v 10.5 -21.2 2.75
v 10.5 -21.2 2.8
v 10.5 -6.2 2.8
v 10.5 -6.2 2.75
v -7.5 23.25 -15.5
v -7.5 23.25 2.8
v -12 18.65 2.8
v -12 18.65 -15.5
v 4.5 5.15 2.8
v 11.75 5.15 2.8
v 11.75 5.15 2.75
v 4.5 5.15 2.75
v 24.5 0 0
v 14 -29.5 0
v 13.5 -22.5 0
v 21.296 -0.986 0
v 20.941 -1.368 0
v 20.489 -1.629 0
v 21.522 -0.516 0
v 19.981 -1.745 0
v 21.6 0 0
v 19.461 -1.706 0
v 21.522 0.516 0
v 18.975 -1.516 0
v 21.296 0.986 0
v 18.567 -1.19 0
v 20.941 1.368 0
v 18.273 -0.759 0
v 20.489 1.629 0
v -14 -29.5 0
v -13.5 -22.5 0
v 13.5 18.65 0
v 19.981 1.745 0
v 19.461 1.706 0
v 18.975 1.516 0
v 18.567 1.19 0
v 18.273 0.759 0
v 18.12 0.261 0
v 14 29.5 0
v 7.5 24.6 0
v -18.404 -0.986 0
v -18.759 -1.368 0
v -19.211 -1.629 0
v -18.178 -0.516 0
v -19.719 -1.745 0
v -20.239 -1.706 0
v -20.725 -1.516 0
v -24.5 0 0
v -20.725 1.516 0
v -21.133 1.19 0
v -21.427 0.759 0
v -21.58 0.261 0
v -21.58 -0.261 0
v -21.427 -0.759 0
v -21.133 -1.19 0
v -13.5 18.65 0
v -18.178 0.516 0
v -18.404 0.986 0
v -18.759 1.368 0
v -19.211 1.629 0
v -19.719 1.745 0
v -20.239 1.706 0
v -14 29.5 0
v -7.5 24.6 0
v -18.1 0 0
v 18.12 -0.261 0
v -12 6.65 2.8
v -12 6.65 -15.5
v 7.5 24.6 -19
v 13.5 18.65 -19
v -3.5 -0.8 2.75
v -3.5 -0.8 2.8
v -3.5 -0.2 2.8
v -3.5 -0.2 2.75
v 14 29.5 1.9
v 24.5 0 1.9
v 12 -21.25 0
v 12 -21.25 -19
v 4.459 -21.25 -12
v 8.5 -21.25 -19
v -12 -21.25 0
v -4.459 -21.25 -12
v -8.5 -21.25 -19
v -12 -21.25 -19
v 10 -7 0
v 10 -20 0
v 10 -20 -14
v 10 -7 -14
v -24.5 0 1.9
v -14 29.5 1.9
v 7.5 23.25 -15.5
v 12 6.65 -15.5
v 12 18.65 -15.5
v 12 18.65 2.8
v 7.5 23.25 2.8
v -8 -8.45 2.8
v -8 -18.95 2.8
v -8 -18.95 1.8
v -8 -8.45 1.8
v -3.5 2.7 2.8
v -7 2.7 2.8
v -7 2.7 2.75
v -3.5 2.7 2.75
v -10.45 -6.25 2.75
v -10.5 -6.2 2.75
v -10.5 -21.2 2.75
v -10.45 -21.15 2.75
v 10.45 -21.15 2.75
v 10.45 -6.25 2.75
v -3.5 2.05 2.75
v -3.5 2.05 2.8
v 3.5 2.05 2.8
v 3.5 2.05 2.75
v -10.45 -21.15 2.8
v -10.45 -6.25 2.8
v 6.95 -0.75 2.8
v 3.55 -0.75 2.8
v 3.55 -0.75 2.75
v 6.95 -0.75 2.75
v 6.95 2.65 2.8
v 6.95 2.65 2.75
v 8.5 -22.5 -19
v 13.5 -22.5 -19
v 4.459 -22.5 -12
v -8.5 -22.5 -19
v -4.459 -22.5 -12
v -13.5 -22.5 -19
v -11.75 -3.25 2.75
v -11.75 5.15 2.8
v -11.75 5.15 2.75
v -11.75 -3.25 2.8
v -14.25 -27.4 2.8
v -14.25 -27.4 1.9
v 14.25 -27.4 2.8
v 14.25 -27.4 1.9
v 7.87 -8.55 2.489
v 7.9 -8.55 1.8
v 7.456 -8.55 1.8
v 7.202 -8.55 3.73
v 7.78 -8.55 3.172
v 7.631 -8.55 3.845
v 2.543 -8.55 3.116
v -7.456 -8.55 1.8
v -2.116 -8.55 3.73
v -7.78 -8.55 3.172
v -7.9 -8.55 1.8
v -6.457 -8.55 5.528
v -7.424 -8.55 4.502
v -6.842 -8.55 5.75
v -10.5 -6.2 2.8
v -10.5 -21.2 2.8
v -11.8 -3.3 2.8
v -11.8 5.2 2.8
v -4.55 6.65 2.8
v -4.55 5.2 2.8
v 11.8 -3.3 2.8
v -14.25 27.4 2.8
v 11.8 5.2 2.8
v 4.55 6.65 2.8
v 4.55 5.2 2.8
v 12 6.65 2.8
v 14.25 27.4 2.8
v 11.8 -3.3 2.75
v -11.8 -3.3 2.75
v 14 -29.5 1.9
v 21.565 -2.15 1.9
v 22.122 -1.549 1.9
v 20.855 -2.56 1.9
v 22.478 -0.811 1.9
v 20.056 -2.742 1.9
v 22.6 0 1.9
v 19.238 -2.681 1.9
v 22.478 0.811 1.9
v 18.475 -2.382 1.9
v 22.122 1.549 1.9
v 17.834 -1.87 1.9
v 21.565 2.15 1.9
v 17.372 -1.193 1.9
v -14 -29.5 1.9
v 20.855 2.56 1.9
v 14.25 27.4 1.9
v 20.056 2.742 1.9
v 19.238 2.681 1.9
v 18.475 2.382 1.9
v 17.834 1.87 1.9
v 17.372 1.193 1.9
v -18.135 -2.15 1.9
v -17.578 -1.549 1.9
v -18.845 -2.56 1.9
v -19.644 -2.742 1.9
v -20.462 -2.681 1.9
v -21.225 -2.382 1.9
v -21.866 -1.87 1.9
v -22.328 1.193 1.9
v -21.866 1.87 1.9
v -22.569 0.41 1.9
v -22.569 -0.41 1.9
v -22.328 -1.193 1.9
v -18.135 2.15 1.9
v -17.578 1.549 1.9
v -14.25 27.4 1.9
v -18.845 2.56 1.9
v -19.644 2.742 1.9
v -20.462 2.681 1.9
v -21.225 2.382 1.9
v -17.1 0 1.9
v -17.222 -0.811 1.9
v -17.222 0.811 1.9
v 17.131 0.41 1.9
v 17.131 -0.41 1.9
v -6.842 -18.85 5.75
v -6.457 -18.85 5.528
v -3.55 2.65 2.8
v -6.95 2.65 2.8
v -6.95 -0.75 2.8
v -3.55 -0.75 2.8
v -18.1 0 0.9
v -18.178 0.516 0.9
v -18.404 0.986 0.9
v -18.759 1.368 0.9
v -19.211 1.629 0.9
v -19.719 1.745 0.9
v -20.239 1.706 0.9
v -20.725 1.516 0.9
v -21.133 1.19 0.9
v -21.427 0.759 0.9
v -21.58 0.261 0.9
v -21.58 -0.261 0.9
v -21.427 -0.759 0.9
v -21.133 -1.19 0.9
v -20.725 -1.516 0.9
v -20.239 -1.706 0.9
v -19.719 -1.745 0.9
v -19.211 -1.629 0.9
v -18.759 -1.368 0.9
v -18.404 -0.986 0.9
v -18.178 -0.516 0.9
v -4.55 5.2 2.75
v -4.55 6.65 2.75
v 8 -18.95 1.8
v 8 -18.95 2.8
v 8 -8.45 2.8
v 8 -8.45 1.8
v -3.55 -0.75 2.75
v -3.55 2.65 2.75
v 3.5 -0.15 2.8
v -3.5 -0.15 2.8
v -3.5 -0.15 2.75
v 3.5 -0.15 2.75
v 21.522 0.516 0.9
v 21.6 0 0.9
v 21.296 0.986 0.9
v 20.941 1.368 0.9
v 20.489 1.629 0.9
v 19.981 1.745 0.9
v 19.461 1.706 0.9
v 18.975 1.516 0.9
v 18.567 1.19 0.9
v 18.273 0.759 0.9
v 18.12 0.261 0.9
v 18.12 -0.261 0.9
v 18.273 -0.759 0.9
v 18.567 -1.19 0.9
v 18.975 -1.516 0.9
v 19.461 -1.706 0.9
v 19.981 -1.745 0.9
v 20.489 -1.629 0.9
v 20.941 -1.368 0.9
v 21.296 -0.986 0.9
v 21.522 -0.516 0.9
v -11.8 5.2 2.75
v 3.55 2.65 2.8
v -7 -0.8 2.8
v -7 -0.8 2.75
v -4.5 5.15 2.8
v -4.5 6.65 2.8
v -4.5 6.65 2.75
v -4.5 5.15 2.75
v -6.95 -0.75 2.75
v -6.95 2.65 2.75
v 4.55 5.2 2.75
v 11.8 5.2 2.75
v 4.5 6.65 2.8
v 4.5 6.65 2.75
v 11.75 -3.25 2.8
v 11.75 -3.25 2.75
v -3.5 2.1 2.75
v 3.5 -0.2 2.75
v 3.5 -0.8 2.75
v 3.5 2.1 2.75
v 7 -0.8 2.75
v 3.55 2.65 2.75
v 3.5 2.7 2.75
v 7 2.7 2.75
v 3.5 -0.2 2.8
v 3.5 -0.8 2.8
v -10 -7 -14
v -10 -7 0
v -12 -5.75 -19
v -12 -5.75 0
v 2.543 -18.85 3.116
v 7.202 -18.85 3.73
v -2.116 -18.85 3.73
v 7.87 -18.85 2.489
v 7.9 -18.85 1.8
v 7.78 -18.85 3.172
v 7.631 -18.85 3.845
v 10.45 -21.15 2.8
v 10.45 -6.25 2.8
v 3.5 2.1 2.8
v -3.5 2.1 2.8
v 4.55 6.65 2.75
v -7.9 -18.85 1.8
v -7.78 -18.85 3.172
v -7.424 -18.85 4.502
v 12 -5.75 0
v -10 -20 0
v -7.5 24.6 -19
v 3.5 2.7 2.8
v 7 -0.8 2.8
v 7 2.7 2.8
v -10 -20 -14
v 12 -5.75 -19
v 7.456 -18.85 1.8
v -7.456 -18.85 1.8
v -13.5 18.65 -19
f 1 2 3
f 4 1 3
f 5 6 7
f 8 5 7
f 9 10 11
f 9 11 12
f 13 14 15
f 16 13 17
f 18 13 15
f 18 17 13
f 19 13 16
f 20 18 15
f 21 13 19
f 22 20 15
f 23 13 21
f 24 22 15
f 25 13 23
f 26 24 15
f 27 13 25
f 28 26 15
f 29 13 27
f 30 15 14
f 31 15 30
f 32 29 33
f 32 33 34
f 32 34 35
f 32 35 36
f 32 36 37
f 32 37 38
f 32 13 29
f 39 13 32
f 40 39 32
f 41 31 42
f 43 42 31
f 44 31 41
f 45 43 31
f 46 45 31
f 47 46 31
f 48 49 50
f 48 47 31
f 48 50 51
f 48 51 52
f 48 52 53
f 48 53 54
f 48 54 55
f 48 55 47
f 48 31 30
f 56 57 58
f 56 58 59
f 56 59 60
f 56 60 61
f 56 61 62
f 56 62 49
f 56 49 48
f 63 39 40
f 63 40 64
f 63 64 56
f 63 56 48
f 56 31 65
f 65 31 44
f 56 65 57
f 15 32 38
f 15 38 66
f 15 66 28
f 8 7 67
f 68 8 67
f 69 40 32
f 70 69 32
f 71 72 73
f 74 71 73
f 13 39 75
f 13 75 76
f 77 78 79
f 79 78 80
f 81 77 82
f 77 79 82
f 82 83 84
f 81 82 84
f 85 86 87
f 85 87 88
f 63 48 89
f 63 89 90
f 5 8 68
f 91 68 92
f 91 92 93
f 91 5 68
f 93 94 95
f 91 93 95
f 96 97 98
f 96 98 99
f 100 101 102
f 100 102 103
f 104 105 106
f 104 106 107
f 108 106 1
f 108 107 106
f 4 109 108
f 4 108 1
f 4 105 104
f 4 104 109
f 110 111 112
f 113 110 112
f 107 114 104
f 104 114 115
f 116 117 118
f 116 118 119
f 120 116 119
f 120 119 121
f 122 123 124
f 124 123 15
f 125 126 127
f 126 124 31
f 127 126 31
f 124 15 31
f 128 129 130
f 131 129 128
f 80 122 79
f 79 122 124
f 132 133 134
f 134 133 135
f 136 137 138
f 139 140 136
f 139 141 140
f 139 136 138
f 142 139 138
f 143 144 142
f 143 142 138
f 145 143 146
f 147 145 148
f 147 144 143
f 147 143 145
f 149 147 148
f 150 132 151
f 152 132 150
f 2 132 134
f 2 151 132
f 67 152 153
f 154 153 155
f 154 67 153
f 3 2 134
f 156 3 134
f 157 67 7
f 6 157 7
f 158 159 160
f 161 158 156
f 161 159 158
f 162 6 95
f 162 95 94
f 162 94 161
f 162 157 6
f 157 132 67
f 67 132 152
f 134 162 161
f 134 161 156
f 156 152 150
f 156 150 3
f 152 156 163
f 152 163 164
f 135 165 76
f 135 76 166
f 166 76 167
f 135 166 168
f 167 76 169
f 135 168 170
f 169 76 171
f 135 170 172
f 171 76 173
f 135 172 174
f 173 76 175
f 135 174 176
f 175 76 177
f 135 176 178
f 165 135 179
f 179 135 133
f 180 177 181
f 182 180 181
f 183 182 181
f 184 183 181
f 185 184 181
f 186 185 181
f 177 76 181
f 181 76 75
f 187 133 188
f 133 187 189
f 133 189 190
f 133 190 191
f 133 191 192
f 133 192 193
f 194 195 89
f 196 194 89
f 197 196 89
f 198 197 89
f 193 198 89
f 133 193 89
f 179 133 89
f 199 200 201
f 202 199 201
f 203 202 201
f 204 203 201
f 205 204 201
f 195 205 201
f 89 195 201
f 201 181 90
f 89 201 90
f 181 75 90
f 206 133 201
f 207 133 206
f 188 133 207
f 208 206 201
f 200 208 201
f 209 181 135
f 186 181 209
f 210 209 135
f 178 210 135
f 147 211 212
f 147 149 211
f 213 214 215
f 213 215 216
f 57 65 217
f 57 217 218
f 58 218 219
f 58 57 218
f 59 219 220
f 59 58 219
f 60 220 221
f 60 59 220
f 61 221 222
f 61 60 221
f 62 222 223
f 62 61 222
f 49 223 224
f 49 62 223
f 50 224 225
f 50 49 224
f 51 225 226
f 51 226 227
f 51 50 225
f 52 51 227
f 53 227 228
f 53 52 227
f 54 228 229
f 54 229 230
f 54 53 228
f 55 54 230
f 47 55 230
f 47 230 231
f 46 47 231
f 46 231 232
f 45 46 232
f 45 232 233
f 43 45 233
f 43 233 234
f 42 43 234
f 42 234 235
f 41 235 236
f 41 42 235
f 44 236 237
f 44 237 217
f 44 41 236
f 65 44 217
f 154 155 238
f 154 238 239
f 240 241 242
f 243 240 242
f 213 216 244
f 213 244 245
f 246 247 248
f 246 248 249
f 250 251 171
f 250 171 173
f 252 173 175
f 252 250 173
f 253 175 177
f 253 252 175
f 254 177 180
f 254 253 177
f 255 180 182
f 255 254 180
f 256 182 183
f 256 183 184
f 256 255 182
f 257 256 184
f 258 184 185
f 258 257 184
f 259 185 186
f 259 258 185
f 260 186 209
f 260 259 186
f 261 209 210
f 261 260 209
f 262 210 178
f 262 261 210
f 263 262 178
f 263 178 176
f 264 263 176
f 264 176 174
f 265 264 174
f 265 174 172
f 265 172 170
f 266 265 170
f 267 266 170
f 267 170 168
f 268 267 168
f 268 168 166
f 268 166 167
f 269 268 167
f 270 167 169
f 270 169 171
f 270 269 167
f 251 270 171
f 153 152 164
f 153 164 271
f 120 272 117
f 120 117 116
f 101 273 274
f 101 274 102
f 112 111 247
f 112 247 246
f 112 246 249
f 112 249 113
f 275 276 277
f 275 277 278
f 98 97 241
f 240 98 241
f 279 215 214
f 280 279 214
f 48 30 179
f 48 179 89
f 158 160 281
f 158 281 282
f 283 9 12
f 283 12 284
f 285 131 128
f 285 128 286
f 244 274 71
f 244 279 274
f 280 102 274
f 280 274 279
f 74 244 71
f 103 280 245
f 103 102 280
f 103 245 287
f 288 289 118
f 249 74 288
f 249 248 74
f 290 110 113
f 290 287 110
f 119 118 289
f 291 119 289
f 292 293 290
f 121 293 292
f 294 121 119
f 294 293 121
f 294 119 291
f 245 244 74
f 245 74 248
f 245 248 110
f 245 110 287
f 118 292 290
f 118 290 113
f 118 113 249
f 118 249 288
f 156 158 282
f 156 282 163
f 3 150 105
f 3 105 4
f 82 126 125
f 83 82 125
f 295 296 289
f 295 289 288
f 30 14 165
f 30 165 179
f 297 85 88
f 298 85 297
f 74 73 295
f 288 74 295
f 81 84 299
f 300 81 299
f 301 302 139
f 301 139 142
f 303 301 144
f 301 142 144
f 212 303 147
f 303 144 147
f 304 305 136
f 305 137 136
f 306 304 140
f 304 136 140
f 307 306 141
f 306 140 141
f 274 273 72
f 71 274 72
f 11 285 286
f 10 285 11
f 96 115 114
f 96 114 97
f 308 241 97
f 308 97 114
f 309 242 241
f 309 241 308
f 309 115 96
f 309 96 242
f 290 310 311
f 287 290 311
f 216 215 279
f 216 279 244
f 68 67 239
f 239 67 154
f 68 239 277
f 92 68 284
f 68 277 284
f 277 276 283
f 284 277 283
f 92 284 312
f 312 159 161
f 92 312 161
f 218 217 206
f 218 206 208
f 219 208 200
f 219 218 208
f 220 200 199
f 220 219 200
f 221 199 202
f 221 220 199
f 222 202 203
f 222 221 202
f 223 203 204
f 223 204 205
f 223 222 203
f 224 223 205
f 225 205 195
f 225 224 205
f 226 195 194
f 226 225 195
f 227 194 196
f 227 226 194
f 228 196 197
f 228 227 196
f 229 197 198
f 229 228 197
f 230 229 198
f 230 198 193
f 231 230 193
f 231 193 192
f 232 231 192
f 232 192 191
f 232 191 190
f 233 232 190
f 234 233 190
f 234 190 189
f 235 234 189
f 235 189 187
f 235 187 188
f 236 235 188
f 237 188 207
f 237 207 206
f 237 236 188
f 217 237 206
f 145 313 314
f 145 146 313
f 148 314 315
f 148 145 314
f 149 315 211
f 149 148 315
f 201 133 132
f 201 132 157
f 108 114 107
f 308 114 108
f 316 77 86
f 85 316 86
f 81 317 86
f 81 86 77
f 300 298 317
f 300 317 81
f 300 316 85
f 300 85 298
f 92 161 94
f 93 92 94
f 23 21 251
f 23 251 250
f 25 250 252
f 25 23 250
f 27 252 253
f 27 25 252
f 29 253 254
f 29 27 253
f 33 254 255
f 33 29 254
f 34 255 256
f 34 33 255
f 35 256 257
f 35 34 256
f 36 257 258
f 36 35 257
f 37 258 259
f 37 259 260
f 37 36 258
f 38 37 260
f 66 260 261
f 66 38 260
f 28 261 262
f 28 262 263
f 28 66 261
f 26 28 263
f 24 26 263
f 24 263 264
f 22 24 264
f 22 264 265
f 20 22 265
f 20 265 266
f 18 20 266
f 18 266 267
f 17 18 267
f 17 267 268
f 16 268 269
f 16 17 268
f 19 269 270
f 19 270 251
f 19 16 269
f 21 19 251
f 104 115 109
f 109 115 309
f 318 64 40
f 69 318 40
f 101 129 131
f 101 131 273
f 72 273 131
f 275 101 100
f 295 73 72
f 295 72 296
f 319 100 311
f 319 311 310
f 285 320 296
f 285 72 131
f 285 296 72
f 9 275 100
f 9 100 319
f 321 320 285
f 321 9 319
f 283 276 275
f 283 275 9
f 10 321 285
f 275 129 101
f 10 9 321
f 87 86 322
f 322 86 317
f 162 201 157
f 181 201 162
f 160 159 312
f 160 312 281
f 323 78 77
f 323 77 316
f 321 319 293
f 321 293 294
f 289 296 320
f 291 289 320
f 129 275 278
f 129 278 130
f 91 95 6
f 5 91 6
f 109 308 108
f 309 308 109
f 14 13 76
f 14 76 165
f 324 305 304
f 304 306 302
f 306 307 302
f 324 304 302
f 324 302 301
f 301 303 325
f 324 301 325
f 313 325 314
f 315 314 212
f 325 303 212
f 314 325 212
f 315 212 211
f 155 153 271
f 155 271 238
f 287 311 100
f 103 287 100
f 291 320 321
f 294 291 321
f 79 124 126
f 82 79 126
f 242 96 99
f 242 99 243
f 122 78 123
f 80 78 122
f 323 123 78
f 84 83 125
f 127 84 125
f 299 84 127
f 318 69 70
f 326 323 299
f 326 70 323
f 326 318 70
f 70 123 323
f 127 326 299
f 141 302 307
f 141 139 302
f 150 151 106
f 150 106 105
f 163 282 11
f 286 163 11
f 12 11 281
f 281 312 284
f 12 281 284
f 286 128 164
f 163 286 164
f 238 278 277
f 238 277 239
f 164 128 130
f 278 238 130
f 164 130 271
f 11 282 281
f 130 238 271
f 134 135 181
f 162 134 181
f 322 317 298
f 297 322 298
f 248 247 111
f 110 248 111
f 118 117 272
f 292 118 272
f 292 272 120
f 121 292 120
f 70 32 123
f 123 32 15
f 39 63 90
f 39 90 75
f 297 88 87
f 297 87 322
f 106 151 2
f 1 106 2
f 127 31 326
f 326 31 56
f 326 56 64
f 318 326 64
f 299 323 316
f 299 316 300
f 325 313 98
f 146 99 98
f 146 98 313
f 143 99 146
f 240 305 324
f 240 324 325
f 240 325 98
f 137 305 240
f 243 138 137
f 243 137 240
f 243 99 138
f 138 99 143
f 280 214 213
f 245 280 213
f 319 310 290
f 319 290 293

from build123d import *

# Parameters (mm, degrees)
SKETCH1_R           = 1.75
BOSS_EXTRUDE1_DEPTH = 1.9
SKETCH2_W           = 28.5
SKETCH2_H           = 54.8
BOSS_EXTRUDE2_DEPTH = 0.9
CHAMFER1_SIZE       = 1
BOSS_EXTRUDE3_DEPTH = 19
CUT_EXTRUDE1_DEPTH  = 18.3
SKETCH5_W           = 3.5
SKETCH5_H           = 3.5
SKETCH5_W_2         = 3.4
SKETCH5_H_2         = 3.4
SKETCH5_W_3         = 7
SKETCH5_H_3         = 0.05
SKETCH5_W_4         = 21
SKETCH5_H_4         = 15
SKETCH5_W_5         = 20.9
SKETCH5_H_5         = 14.9
CUT_EXTRUDE2_DEPTH  = 0.05
SKETCH6_W           = 24
SKETCH6_H           = 15.5
CUT_EXTRUDE3_DEPTH  = 19
CUT_EXTRUDE4_DEPTH  = 1.25
SKETCH8_W           = 20
SKETCH8_H           = 13
BOSS_EXTRUDE4_DEPTH = 14
SKETCH5_3_W         = 16
SKETCH5_3_H         = 10.5
CUT_EXTRUDE6_DEPTH  = 1
SKETCH10_W          = 7.9
SKETCH10_H          = 10.3
REVOLVE2_ANGLE      = 30
SKETCH10_6_W        = 7.9
SKETCH10_6_H        = 10.3
REVOLVE3_ANGLE      = 15
FILLET1_R           = 18


with BuildPart() as part:
    # Sketch1 → Boss-Extrude1 (new body)
    with BuildSketch(Plane.XY):
        Polygon((-24.5, 0), (-14, 29.5), (14, 29.5), (24.5, 0), (14, -29.5), (-14, -29.5), align=None)
        with Locations((-19.85, 0)):
            Circle(SKETCH1_R, mode=Mode.SUBTRACT)
        with Locations((19.85, 0)):
            Circle(SKETCH1_R, mode=Mode.SUBTRACT)
    extrude(amount=BOSS_EXTRUDE1_DEPTH)

    # Sketch2 → Boss-Extrude2 (add)
    with BuildSketch(Plane.XY.offset(1.9)):
        Rectangle(SKETCH2_W, SKETCH2_H)
    extrude(amount=BOSS_EXTRUDE2_DEPTH)

    # Chamfer1
    chamfer1_edges = [part.edges().sort_by_distance(p)[0] for p in [
        (-21.6, 0, 1.9),
        (18.1, 0, 1.9),
    ]]
    chamfer(chamfer1_edges, length=CHAMFER1_SIZE)

    # Sketch3 → Boss-Extrude3 (add)
    with BuildSketch(Plane(origin=(0, 0, 0), x_dir=(-1, 0, 0), z_dir=(0, 0, -1))):
        Polygon((7.5, 24.6), (-7.5, 24.6), (-13.5, 18.65), (-13.5, -22.5), (13.5, -22.5), (13.5, 18.65), align=None)
    extrude(amount=BOSS_EXTRUDE3_DEPTH)

    # Sketch4 → Cut-Extrude1 (cut)
    with BuildSketch(Plane.XY.offset(2.8)):
        Polygon((7.5, 23.25), (-7.5, 23.25), (-12, 18.65), (-12, 6.65), (12, 6.65), (12, 18.65), align=None)
    extrude(amount=-CUT_EXTRUDE1_DEPTH, mode=Mode.SUBTRACT)

    # Sketch5 → Cut-Extrude2 (cut)
    with BuildSketch(Plane.XY.offset(2.8)):
        with Locations((-5.25, 0.95)):
            Rectangle(SKETCH5_W, SKETCH5_H)
        with Locations((-5.25, 0.95)):
            Rectangle(SKETCH5_W_2, SKETCH5_H_2, mode=Mode.SUBTRACT)
        Polygon((-3.5, 2.05), (0, 2.05), (3.5, 2.05), (3.5, 2.1), (0, 2.1), (-3.5, 2.1), align=None)
        with Locations((0, -0.175)):
            Rectangle(SKETCH5_W_3, SKETCH5_H_3)
        with Locations((5.25, 0.95)):
            Rectangle(SKETCH5_W, SKETCH5_H)
        with Locations((5.25, 0.95)):
            Rectangle(SKETCH5_W_2, SKETCH5_H_2, mode=Mode.SUBTRACT)
        with Locations((0, -13.7)):
            Rectangle(SKETCH5_W_4, SKETCH5_H_4)
        with Locations((0, -13.7)):
            Rectangle(SKETCH5_W_5, SKETCH5_H_5, mode=Mode.SUBTRACT)
        Polygon((-4.5, 6.65), (-4.5, 5.15), (-11.75, 5.15), (-11.75, -3.25), (11.75, -3.25), (11.75, 5.15), (4.5, 5.15), (4.5, 6.65), (4.55, 6.65), (4.55, 5.2), (11.8, 5.2), (11.8, -3.3), (-11.8, -3.3), (-11.8, 5.2), (-4.55, 5.2), (-4.55, 6.65), align=None)
    extrude(amount=-CUT_EXTRUDE2_DEPTH, mode=Mode.SUBTRACT)

    # Sketch6 → Cut-Extrude3 (cut)
    with BuildSketch(Plane(origin=(0, 0, -19), x_dir=(-1, 0, 0), z_dir=(0, 0, -1))):
        with Locations((0, -13.5)):
            Rectangle(SKETCH6_W, SKETCH6_H)
    extrude(amount=-CUT_EXTRUDE3_DEPTH, mode=Mode.SUBTRACT)

    # Sketch7 → Cut-Extrude4 (cut)
    with BuildSketch(Plane.XZ.offset(22.5)):
        Polygon((8.5, -19), (4.458548116, -12), (-4.458548116, -12), (-8.5, -19), align=None)
    extrude(amount=-CUT_EXTRUDE4_DEPTH, mode=Mode.SUBTRACT)

    # Sketch8 → Boss-Extrude4 (add)
    with BuildSketch(Plane(origin=(0, 0, 0), x_dir=(-1, 0, 0), z_dir=(0, 0, -1))):
        with Locations((0, -13.5)):
            Rectangle(SKETCH8_W, SKETCH8_H)
    extrude(amount=BOSS_EXTRUDE4_DEPTH)

    # Sketch5<3> → Cut-Extrude6 (cut)
    with BuildSketch(Plane.XY.offset(2.8)):
        with Locations((0, -13.7)):
            Rectangle(SKETCH5_3_W, SKETCH5_3_H)
    extrude(amount=-CUT_EXTRUDE6_DEPTH, mode=Mode.SUBTRACT)

    # Sketch10 → Revolve2 (revolve)
    with BuildSketch(Plane.XY.offset(1.8)):
        with Locations((-3.95, -13.7)):
            Rectangle(SKETCH10_W, SKETCH10_H)
    revolve(axis=Axis((0, -8.45, 1.8), (0, 1, 0)), revolution_arc=REVOLVE2_ANGLE)

    # Sketch10<6> → Revolve3 (revolve)
    with BuildSketch(Plane.XY.offset(1.8)):
        with Locations((3.95, -13.7)):
            Rectangle(SKETCH10_6_W, SKETCH10_6_H)
    revolve(axis=Axis((0, -8.45, 1.8), (0, -1, 0)), revolution_arc=REVOLVE3_ANGLE)

    # Fillet1
    fillet1_edges = [part.edges().sort_by_distance(p)[0] for p in [
        (0, -13.7, 1.8),
    ]]
    fillet(fillet1_edges, radius=FILLET1_R)


solid = part.part
